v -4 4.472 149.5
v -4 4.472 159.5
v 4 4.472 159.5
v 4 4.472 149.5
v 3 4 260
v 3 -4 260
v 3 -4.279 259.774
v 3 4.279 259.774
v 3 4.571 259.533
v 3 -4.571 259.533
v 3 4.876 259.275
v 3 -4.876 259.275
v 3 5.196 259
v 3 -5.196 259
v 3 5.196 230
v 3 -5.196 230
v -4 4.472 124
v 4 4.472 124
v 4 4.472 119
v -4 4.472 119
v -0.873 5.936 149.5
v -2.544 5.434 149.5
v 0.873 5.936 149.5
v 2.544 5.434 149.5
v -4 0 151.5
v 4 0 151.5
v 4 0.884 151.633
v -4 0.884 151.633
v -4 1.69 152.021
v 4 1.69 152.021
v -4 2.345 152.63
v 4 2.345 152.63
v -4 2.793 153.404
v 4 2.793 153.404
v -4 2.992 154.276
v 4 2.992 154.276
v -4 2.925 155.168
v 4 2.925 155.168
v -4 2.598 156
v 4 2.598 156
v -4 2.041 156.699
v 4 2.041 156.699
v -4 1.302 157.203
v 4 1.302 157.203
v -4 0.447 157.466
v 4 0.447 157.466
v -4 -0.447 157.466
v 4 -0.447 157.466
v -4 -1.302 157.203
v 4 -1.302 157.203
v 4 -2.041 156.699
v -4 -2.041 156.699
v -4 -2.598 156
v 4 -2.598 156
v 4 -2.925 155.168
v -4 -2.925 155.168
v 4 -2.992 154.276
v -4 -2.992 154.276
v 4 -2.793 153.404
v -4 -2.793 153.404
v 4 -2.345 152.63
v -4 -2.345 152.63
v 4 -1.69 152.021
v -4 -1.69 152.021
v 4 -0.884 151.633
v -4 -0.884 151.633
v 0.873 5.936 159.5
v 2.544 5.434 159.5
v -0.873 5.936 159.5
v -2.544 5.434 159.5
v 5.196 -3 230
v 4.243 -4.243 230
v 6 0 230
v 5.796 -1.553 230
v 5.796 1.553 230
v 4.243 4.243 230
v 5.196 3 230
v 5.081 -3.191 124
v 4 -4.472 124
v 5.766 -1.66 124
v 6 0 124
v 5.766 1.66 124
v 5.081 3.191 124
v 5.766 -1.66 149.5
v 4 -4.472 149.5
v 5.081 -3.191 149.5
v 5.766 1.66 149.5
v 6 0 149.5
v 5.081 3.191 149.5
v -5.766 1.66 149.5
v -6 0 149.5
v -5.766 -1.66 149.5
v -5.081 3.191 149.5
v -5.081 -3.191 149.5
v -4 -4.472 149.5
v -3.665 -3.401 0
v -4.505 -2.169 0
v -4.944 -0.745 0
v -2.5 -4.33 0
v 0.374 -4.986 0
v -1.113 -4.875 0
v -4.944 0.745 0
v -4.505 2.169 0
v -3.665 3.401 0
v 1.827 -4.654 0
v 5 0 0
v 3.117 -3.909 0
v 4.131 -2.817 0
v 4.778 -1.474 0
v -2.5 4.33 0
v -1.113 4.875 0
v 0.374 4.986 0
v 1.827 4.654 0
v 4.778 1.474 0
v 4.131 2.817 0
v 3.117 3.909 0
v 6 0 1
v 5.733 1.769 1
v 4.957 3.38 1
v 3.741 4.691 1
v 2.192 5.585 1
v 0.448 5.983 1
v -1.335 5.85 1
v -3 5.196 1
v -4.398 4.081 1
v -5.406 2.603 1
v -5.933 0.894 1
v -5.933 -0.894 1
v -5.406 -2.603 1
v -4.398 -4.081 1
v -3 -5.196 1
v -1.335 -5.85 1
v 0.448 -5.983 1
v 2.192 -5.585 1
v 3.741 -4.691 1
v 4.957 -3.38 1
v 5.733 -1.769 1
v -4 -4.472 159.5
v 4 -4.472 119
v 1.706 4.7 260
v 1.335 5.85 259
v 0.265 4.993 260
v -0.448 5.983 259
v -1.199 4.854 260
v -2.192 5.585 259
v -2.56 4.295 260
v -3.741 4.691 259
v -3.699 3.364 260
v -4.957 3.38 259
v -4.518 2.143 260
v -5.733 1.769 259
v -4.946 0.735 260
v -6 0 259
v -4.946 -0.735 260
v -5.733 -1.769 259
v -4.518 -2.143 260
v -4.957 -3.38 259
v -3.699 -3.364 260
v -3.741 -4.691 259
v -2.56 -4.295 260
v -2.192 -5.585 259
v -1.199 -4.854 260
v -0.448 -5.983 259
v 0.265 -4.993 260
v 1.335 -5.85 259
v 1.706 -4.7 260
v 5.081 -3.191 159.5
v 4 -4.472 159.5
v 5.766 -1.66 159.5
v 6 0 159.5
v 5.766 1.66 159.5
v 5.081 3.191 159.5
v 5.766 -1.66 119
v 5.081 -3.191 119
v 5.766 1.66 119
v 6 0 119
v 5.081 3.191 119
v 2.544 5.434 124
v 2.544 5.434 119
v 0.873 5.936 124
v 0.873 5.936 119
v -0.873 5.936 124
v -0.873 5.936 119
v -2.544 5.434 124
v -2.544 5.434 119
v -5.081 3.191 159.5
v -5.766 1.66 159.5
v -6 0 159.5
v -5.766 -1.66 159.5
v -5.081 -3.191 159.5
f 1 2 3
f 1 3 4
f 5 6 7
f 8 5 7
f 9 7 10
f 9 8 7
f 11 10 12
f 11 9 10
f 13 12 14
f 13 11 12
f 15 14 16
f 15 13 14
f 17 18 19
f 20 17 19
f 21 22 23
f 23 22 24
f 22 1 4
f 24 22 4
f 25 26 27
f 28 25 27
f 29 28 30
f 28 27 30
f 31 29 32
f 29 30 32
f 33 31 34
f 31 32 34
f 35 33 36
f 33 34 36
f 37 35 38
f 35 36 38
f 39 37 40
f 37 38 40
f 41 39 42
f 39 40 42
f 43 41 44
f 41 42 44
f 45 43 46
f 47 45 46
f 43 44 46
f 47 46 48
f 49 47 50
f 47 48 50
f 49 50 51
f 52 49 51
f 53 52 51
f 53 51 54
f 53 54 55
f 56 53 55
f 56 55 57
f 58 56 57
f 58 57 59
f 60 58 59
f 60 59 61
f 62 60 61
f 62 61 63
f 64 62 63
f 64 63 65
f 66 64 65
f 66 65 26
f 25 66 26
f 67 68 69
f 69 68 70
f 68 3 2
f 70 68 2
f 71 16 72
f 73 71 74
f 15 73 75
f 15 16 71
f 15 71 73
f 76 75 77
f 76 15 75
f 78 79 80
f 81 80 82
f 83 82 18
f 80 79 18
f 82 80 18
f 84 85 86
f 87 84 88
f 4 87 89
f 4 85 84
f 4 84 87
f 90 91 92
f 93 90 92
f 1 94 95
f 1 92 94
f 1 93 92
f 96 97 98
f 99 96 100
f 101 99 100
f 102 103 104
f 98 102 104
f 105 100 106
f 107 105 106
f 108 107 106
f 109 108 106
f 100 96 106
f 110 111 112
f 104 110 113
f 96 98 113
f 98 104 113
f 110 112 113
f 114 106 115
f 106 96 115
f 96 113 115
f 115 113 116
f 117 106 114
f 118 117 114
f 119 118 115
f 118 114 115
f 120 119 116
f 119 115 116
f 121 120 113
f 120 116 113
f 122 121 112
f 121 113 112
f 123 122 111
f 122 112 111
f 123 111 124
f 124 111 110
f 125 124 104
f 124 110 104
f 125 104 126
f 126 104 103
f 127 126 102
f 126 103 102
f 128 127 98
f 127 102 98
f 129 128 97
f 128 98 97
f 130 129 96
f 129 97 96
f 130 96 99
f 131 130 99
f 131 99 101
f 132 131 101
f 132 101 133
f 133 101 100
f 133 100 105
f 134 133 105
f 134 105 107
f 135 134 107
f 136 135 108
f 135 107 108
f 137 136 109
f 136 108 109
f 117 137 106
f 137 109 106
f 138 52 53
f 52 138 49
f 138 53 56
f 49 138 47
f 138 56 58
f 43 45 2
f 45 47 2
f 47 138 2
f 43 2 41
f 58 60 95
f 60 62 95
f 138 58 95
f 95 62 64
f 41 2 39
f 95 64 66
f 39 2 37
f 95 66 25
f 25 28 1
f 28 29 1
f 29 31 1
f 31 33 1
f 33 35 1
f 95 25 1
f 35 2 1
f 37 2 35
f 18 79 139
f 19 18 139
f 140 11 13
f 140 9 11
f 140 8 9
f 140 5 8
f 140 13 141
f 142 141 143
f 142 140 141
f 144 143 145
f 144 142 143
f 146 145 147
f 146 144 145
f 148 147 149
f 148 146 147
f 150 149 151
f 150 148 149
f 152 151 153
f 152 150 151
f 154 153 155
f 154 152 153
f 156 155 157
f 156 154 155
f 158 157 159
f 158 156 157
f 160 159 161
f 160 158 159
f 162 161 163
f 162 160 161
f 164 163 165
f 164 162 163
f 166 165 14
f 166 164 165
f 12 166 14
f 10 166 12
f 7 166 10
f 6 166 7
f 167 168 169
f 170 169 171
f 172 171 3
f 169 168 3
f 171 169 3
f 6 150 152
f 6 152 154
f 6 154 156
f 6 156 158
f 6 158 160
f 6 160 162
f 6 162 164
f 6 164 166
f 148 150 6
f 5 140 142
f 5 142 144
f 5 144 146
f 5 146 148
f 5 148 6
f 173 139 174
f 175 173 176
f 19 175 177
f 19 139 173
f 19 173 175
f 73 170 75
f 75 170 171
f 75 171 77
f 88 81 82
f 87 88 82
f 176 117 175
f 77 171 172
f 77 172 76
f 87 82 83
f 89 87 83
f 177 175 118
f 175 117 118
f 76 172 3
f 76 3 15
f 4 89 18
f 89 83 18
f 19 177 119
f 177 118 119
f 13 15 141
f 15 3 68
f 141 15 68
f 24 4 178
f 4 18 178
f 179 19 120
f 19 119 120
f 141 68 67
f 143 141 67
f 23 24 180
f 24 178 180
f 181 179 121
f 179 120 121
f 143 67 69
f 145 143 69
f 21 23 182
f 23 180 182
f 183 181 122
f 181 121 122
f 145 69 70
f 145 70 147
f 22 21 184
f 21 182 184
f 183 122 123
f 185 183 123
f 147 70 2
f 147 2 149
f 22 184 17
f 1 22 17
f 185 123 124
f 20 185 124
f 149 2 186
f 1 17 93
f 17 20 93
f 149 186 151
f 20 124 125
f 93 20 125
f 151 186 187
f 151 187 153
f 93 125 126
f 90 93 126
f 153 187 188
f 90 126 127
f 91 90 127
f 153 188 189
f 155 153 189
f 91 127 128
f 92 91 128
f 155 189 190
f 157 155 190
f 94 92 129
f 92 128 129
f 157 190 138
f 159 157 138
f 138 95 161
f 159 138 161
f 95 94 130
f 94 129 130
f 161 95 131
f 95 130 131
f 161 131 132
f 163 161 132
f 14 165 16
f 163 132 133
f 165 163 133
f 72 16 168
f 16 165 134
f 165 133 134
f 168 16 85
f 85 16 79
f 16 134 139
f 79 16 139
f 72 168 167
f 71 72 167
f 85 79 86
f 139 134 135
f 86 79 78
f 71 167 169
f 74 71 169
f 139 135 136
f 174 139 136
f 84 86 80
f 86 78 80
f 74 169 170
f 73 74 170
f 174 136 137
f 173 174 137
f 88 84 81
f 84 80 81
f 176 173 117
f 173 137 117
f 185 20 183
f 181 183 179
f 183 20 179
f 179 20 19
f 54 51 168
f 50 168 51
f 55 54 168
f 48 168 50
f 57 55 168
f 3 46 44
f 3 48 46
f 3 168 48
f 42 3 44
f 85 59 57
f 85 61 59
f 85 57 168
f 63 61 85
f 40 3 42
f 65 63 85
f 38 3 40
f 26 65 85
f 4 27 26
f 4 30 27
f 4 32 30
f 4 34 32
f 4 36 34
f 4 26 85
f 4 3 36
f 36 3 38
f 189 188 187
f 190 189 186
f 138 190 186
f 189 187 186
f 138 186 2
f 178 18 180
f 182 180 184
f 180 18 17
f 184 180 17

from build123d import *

# Parameters (mm, degrees)
SKETCH1_R               = 6
BOSS_EXTRUDE1_DEPTH     = 260
CHAMFER1_SIZE           = 1
SKETCH3_W               = 3
SKETCH3_H               = 30
SKETCH3_W_2             = 2
SKETCH3_H_2             = 10
SKETCH3_H_3             = 5
CUT_EXTRUDE1_DEPTH      = 7
CUT_EXTRUDE1_DEPTH_BACK = 7
SKETCH4_R               = 3
CUT_EXTRUDE2_DEPTH      = 3
CUT_EXTRUDE2_DEPTH_BACK = 11
SKETCH5_W               = 10
SKETCH5_H               = 1.527864045
SKETCH5_W_2             = 5
CUT_EXTRUDE3_DEPTH      = 7
CUT_EXTRUDE3_DEPTH_BACK = 7


with BuildPart() as part:
    # Sketch1 → Boss-Extrude1 (new body)
    with BuildSketch(Plane.XY):
        Circle(SKETCH1_R)
    extrude(amount=BOSS_EXTRUDE1_DEPTH)

    # Chamfer1
    chamfer1_edges = [part.edges().sort_by_distance(p)[0] for p in [
        (-6, 0, 0),
        (-6, 0, 260),
    ]]
    chamfer(chamfer1_edges, length=CHAMFER1_SIZE)

    # Sketch3 → Cut-Extrude1 (cut, two sides)
    with BuildSketch(Plane(origin=(0, 0, 0), x_dir=(1, 0, 0), z_dir=(0, 1, 0))) as cut_extrude1_sk:
        with Locations((4.5, -245)):
            Rectangle(SKETCH3_W, SKETCH3_H)
        with Locations((5, -154.5)):
            Rectangle(SKETCH3_W_2, SKETCH3_H_2)
        with Locations((-5, -154.5)):
            Rectangle(SKETCH3_W_2, SKETCH3_H_2)
        with Locations((5, -121.5)):
            Rectangle(SKETCH3_W_2, SKETCH3_H_3)
    extrude(amount=CUT_EXTRUDE1_DEPTH, mode=Mode.SUBTRACT)
    extrude(cut_extrude1_sk.sketch, amount=-CUT_EXTRUDE1_DEPTH_BACK, mode=Mode.SUBTRACT)

    # Sketch4 → Cut-Extrude2 (cut, two sides)
    with BuildSketch(Plane(origin=(4, 0, 0), x_dir=(0, 0, -1), z_dir=(1, 0, 0))) as cut_extrude2_sk:
        with Locations((-154.5, 0)):
            Circle(SKETCH4_R)
    extrude(amount=CUT_EXTRUDE2_DEPTH, mode=Mode.SUBTRACT)
    extrude(cut_extrude2_sk.sketch, amount=-CUT_EXTRUDE2_DEPTH_BACK, mode=Mode.SUBTRACT)

    # Sketch5 → Cut-Extrude3 (cut, two sides)
    with BuildSketch(Plane(origin=(0, 0, 0), x_dir=(0, 0, -1), z_dir=(1, 0, 0))) as cut_extrude3_sk:
        with Locations((-154.5, 5.236067978)):
            Rectangle(SKETCH5_W, SKETCH5_H)
        with Locations((-121.5, 5.236067978)):
            Rectangle(SKETCH5_W_2, SKETCH5_H)
    extrude(amount=CUT_EXTRUDE3_DEPTH, mode=Mode.SUBTRACT)
    extrude(cut_extrude3_sk.sketch, amount=-CUT_EXTRUDE3_DEPTH_BACK, mode=Mode.SUBTRACT)


solid = part.part
